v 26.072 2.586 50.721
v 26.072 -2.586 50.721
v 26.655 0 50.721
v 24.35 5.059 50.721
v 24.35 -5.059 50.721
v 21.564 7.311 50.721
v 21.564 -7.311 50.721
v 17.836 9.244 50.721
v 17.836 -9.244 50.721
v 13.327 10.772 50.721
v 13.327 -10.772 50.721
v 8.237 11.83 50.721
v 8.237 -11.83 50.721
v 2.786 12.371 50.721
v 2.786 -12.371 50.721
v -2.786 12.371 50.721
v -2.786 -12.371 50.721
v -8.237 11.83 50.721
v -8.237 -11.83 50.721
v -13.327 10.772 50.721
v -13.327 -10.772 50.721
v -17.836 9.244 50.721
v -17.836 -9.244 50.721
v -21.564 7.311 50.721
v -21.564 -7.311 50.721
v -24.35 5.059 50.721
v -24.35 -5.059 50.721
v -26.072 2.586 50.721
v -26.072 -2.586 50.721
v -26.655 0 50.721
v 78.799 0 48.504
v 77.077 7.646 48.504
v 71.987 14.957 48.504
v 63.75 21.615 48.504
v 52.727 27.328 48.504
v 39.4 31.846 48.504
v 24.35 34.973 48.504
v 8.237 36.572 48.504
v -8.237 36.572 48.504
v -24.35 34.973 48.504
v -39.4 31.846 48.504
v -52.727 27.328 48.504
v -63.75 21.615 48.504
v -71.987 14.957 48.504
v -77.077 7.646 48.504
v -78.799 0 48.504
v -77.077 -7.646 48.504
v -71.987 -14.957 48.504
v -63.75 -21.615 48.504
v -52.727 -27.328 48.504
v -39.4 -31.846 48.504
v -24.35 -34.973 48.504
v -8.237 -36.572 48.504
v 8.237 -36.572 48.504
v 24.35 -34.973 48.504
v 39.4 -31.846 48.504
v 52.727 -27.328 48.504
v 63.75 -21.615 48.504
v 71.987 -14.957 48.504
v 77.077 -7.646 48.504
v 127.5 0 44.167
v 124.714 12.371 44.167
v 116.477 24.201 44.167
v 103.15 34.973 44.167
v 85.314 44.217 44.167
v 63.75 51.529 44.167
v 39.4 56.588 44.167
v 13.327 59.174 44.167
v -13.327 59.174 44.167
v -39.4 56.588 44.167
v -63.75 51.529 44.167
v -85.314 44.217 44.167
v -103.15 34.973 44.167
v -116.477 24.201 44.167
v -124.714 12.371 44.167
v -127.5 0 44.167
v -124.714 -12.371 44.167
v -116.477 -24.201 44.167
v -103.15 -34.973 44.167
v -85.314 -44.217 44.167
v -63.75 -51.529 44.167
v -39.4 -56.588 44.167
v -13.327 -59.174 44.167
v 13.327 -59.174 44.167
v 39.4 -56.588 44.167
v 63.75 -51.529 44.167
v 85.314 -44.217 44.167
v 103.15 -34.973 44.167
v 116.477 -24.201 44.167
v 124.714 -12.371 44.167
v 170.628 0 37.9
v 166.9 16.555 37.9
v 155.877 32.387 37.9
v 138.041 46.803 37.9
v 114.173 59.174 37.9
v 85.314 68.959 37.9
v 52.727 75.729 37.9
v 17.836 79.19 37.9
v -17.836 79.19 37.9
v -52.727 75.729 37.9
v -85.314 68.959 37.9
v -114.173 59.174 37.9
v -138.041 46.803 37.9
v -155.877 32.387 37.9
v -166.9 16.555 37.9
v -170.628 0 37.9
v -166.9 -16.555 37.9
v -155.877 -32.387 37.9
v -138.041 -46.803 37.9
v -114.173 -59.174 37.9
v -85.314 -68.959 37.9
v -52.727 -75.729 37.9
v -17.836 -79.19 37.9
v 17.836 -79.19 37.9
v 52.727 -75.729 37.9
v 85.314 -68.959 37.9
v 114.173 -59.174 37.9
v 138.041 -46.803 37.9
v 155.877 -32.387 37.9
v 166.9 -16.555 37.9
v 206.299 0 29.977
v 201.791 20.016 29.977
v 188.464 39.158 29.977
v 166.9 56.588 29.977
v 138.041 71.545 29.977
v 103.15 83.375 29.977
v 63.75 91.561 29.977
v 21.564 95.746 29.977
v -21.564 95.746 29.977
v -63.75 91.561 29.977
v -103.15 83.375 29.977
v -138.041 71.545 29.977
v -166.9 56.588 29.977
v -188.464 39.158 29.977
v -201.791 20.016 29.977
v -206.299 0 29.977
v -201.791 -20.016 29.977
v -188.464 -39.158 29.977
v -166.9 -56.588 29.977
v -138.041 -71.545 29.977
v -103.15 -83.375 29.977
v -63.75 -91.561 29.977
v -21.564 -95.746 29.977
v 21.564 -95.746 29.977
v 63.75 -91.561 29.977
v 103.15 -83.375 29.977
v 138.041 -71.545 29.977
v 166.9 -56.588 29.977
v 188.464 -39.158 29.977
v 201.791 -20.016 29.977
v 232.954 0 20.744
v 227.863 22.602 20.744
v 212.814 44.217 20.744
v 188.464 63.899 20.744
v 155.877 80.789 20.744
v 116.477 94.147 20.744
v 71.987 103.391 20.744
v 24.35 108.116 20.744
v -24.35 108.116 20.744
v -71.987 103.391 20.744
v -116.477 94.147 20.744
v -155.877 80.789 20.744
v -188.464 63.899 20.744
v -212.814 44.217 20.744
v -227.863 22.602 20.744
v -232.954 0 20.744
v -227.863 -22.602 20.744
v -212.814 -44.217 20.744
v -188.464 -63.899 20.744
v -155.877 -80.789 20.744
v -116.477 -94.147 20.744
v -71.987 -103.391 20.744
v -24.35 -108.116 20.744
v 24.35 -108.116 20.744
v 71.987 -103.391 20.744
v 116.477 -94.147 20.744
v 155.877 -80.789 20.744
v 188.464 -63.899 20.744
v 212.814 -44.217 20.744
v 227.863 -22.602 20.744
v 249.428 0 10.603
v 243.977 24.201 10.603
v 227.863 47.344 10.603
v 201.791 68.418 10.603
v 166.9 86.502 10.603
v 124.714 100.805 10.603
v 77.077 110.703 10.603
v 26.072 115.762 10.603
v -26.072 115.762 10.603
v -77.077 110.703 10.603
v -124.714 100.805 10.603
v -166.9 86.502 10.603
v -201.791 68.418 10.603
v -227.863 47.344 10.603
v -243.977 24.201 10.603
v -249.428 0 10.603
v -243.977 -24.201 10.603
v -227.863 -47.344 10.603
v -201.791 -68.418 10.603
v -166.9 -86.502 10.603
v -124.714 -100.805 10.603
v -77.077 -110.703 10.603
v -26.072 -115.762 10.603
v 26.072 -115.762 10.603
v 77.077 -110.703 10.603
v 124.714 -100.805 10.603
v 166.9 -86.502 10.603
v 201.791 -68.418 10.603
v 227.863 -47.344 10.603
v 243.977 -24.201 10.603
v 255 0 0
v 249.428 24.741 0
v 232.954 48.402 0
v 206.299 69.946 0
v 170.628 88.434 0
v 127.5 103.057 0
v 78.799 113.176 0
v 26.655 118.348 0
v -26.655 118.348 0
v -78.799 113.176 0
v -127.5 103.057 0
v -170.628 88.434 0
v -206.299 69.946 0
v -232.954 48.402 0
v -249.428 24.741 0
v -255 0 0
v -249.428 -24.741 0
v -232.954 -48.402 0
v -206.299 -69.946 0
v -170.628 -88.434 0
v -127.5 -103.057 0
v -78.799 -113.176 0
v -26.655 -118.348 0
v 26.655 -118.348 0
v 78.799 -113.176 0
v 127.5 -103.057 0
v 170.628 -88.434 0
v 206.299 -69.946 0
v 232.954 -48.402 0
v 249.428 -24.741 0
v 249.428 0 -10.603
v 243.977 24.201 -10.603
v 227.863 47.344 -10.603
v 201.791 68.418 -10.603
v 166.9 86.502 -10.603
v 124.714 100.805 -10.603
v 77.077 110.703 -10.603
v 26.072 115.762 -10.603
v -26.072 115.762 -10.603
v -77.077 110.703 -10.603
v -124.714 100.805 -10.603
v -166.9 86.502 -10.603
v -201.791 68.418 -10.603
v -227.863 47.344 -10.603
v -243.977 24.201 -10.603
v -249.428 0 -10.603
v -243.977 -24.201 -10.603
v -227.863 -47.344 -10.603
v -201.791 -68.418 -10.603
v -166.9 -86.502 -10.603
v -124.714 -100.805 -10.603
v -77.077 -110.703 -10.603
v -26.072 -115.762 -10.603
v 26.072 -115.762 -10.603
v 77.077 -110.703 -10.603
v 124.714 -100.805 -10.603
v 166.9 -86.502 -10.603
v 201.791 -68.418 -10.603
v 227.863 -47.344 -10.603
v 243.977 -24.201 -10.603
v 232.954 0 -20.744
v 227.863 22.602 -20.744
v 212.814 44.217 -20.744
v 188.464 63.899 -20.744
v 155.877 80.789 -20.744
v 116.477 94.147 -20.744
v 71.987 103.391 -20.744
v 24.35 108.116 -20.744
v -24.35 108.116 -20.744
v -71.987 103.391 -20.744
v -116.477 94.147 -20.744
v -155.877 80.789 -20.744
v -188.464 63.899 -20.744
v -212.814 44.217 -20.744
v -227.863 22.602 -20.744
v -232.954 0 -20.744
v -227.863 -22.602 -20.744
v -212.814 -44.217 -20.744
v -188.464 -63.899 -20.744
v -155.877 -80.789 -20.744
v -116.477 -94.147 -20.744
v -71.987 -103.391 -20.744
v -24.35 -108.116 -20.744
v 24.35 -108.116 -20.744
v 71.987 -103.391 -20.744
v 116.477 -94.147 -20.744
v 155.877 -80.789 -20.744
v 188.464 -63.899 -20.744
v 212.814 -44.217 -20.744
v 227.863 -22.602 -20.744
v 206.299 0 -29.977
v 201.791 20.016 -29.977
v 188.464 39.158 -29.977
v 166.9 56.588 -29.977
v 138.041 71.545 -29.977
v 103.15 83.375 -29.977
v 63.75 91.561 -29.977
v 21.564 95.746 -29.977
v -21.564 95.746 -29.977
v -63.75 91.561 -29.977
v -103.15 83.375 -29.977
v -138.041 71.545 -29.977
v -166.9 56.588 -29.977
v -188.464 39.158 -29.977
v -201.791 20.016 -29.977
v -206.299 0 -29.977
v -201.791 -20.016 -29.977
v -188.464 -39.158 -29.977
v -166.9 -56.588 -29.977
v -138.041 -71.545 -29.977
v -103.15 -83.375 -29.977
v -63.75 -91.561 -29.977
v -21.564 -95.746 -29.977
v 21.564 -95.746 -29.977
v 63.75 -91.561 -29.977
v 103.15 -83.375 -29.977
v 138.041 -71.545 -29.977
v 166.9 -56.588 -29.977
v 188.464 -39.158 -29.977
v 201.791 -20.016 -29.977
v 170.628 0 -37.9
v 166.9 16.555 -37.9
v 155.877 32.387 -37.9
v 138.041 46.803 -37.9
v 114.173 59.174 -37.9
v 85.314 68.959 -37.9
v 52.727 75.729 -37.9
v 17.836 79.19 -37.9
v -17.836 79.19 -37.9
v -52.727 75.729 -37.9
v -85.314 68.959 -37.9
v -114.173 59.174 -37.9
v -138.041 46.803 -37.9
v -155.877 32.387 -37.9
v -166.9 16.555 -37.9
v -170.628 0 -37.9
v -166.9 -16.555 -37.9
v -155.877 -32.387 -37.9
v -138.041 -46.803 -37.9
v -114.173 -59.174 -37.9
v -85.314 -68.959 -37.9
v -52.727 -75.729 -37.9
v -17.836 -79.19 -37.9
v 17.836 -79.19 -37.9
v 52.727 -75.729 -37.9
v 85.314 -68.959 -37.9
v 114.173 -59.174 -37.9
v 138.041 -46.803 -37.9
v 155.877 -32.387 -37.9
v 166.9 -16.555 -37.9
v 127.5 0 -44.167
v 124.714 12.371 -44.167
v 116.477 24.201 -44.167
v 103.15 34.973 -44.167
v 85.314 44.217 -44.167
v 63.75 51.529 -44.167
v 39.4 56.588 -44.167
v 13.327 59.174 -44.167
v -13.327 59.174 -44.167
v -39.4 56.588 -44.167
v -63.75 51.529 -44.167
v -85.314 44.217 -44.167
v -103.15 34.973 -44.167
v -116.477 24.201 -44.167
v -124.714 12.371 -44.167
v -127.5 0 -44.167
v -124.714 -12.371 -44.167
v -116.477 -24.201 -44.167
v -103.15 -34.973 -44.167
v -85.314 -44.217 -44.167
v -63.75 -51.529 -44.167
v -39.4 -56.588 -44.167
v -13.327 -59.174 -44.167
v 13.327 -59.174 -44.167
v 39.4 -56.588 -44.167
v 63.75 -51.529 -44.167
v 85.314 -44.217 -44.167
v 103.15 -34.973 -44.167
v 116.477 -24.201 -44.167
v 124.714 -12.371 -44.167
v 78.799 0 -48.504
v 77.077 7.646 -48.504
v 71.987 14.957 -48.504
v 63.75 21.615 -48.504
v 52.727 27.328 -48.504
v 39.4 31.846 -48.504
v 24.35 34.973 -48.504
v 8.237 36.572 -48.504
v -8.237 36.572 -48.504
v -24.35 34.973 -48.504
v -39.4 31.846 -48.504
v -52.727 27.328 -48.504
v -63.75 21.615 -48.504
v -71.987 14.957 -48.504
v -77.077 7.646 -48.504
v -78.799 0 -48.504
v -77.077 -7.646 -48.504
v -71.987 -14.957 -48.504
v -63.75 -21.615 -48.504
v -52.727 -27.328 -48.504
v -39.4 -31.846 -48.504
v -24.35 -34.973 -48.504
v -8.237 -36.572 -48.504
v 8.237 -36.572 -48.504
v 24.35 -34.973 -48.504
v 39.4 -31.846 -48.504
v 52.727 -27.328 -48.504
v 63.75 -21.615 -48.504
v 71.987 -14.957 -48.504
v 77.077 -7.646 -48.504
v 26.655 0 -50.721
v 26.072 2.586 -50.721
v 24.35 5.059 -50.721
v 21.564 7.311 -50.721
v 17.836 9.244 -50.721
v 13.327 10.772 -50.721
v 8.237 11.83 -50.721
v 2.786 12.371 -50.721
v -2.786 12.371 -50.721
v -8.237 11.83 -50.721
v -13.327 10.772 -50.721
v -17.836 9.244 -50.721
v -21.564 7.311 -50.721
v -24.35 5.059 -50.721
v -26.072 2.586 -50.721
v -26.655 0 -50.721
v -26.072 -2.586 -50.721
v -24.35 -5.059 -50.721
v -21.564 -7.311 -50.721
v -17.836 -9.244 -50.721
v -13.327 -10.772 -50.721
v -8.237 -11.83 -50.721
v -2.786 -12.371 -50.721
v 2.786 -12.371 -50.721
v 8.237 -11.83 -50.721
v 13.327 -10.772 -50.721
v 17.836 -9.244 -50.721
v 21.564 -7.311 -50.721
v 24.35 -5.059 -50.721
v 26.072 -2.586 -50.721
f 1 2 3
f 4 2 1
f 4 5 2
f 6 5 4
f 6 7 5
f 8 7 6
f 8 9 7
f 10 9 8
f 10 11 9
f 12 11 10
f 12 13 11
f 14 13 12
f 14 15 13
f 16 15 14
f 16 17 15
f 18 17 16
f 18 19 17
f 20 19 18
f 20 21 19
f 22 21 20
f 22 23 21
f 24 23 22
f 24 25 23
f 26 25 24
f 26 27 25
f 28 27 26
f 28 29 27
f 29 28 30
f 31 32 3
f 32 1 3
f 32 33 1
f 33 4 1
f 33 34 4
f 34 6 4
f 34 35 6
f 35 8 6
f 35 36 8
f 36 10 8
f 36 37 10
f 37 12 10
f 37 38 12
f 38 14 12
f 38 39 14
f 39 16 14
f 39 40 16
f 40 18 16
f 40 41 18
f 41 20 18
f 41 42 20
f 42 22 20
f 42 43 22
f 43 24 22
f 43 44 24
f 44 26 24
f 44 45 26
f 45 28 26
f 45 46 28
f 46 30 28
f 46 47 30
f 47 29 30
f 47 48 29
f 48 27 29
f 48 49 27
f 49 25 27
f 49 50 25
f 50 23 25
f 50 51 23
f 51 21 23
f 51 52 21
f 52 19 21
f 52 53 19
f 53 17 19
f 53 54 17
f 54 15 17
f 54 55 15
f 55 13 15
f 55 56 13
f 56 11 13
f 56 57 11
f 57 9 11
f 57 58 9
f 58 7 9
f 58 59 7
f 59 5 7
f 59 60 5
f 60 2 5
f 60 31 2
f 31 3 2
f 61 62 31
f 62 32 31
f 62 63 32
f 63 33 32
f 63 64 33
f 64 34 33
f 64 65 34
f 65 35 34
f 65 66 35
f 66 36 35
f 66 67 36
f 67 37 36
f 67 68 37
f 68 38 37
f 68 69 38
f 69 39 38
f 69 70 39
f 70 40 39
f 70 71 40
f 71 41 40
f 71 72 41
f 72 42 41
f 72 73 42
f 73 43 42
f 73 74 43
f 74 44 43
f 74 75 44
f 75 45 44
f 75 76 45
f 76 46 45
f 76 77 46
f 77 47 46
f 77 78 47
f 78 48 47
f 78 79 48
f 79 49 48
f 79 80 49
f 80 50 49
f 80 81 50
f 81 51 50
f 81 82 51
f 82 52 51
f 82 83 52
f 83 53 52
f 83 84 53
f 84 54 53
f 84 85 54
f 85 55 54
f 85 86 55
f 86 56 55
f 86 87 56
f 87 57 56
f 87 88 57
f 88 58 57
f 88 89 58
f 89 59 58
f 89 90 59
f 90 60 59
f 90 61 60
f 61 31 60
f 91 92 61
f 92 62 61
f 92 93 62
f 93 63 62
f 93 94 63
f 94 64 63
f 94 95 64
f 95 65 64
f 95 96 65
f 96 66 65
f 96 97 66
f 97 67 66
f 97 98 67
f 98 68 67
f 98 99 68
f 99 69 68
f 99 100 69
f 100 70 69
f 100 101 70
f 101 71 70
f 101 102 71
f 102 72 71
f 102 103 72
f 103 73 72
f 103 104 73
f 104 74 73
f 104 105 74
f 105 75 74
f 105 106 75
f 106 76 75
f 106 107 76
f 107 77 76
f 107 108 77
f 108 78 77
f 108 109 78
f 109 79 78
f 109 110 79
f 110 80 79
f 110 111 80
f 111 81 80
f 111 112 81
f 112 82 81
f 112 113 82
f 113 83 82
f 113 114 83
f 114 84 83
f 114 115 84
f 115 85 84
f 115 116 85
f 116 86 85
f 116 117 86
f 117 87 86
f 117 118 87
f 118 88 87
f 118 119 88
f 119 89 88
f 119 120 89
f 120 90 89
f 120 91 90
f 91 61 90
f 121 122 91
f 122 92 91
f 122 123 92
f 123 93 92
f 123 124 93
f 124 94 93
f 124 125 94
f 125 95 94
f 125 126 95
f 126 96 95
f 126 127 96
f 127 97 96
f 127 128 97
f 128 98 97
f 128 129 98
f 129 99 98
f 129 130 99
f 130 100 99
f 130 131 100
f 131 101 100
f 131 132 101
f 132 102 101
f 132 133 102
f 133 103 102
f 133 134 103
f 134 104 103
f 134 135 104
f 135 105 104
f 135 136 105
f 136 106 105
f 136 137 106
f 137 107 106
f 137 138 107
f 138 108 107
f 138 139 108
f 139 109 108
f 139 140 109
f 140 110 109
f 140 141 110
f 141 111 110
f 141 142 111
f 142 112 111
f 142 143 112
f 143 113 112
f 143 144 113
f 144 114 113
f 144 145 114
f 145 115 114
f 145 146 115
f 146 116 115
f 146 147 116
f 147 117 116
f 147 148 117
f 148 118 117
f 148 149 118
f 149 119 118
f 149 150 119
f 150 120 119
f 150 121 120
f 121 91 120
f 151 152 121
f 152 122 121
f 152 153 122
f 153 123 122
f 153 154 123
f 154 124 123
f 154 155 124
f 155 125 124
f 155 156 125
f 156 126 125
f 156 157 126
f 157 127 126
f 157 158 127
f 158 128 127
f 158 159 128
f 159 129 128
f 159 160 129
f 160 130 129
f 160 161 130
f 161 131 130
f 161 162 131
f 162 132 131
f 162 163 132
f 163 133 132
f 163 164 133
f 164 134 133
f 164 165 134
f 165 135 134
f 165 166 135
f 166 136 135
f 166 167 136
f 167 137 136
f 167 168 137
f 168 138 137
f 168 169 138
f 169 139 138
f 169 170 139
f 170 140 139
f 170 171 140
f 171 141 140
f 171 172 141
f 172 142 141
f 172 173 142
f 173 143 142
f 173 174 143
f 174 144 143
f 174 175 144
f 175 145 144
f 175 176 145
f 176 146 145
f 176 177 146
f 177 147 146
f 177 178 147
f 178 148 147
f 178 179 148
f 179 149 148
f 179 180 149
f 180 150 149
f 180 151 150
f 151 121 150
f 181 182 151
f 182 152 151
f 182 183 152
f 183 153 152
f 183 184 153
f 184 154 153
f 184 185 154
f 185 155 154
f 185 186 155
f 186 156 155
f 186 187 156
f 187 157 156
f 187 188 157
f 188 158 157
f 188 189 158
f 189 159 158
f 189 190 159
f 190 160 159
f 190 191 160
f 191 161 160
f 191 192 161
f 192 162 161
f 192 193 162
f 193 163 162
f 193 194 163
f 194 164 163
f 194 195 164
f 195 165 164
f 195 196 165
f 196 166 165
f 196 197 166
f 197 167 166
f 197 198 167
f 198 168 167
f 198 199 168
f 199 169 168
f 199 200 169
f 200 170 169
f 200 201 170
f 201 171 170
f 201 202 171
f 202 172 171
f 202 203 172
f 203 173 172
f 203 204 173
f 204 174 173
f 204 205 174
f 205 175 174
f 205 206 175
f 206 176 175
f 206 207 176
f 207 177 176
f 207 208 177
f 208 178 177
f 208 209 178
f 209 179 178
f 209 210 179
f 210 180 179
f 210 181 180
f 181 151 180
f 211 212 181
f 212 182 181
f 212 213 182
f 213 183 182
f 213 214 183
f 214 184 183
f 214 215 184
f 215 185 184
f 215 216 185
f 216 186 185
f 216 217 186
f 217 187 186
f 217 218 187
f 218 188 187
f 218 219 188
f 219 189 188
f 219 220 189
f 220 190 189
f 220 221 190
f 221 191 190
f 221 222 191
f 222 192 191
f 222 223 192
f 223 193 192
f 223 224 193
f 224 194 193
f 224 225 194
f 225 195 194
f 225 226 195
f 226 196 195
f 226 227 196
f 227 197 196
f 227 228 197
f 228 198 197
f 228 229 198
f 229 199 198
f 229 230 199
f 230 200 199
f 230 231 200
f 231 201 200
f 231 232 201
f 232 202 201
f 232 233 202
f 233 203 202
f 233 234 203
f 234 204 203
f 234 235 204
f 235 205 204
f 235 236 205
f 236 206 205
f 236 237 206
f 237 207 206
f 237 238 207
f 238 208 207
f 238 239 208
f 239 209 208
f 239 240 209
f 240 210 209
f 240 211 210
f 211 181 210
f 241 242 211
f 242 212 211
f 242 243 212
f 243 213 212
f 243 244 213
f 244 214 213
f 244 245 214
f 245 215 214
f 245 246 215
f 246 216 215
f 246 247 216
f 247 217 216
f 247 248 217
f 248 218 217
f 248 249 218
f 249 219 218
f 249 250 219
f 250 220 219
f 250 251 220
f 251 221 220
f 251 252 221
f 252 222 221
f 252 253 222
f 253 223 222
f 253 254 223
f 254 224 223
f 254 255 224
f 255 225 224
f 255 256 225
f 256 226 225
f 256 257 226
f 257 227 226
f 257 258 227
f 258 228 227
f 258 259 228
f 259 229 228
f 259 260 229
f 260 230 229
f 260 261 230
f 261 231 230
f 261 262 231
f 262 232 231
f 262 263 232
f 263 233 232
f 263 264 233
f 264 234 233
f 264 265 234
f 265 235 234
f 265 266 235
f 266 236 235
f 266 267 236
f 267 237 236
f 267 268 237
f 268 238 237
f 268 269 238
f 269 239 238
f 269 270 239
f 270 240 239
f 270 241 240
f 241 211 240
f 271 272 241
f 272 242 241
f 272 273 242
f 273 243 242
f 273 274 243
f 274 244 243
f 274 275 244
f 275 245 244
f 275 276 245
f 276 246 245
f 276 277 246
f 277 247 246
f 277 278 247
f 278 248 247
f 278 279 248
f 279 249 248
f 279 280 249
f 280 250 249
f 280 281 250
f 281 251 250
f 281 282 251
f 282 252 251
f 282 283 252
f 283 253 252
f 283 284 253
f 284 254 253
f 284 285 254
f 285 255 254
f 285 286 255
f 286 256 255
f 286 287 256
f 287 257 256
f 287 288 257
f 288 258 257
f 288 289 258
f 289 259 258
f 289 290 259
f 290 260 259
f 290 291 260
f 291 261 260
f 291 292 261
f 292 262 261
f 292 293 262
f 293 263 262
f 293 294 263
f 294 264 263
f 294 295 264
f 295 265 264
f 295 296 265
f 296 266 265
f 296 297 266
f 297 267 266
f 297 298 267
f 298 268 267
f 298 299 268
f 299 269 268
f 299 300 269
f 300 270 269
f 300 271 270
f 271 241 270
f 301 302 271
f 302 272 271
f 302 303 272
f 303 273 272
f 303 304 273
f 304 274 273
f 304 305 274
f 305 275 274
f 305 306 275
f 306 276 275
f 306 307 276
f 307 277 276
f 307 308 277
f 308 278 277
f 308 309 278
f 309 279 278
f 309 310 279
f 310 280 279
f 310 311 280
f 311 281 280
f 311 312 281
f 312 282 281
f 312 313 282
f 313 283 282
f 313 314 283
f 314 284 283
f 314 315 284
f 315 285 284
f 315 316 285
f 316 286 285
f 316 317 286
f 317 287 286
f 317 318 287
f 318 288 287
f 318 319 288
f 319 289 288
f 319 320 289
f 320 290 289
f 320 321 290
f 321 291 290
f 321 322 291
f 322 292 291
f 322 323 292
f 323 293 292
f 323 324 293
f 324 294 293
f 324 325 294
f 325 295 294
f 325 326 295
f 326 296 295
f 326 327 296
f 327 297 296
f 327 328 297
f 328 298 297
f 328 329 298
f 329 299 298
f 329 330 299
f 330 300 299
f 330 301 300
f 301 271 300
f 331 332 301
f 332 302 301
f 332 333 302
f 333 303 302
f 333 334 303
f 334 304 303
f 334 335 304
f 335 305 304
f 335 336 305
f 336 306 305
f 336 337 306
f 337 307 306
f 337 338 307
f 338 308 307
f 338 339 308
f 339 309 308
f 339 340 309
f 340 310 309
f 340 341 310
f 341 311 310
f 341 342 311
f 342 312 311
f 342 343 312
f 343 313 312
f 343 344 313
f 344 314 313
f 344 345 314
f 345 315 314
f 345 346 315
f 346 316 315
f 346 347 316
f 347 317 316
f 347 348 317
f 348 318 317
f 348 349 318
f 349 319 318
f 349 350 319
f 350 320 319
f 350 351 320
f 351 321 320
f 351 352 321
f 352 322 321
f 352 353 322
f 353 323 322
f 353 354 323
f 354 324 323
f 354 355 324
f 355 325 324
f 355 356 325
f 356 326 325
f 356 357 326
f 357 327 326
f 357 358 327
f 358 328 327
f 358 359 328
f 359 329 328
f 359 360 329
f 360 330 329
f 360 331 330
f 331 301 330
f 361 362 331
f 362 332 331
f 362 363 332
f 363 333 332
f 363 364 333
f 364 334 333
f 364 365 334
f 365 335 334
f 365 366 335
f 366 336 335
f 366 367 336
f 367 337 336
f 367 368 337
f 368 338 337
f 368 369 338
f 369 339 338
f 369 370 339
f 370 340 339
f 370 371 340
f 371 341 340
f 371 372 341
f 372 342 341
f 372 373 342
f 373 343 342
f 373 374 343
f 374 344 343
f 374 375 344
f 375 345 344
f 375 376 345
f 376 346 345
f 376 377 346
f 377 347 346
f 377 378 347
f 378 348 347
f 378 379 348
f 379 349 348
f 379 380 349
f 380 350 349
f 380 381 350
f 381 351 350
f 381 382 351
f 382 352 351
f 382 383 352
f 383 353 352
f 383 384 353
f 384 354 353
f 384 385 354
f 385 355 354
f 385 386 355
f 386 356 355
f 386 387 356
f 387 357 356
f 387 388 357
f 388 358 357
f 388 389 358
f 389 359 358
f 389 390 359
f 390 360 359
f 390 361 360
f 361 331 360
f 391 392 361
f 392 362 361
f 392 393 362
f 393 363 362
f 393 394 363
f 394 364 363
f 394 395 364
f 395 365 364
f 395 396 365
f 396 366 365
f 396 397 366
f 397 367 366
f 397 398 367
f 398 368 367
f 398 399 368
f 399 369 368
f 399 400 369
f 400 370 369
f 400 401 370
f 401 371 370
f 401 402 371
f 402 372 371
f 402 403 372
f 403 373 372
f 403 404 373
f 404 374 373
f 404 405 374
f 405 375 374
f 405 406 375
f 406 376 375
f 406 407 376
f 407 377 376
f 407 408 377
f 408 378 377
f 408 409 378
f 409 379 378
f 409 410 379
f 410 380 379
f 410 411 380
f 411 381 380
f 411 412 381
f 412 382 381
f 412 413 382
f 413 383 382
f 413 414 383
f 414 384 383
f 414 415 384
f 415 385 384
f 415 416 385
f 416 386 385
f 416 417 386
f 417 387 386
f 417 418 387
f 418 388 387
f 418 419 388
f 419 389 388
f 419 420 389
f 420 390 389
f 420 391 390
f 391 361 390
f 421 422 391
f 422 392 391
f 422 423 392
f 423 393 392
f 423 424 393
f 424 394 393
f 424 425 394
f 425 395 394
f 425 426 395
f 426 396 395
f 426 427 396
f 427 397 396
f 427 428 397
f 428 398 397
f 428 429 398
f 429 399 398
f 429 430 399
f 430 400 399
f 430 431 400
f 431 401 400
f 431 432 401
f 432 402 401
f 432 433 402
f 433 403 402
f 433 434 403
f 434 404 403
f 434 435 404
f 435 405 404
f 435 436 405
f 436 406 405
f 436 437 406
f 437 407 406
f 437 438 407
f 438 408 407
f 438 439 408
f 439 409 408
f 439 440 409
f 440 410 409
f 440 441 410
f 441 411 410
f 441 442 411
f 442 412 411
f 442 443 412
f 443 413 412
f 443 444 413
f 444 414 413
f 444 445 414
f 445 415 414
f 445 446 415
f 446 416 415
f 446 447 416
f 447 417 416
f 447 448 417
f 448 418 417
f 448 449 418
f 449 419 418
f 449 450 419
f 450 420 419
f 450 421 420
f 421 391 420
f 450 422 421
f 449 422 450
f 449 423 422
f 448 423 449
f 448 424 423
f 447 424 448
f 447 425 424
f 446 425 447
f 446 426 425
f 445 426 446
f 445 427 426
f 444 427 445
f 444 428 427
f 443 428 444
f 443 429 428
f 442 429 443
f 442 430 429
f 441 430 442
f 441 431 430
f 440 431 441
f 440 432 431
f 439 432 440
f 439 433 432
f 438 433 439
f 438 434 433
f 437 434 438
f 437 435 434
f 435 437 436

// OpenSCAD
// Generated by SolidPython 1.0.1 on 2020-07-29 00:46:51


scale(v = [15, 7, 3]) {
	sphere(r = 17);
}
/***********************************************
*********      SolidPython code:      **********
************************************************
 
# import packages: SolidPython
from solid import *
from solid.utils import *
from itertools import chain, combinations, permutations


class Resize:

    def __init__(self, scad_file):
        self.scad_file = scad_file
        #self.scad_file = import_scad(scad_file)
        # cone/cylinder param:
        self.r1 = 0
        self.r2 = 0
        self.h = 0
        # rectangular prism param:
        self.w = 0
        self.l = 0
        # ellipse param:
        self.r = 0

    # import OpenScad code (file name corresponds to shape)


    # classify shape + parameters
    def assign(self, param1, param2, param3):
        if self.scad_file == 'cone.scad':
            self.r1 = param1
            self.r2 = param2
            self.h = param3
        elif self.scad_file == 'cylinder.scad':
            self.r1 = param1
            self.r2 = param2
            self.h = param3
        elif self.scad_file == 'rectangularPrism.scad':
            self.h = param1
            self.l = param2
            self.w = param3
        else:
            self.r = param1
            self.h = param2

    # resize parameters
    def iterate(self):
        x = range(3, 20, 2)
        i = 1
        if self.scad_file == 'cone.scad':
            tempList = list(permutations(x, 2))
            for temp in tempList:
                param1 = temp[0]
                param2 = temp[1]
                filepath = 'produced_scad_files/' + 'cone' + str(param1) + '_' + str(param2) + '_' + '.scad'
                scad_render_to_file(cylinder(h=param1, r1=param2, r2=0), filepath)

        elif self.scad_file == 'cylinder.scad':
            tempList = list(permutations(x, 3))
            for temp in tempList:
                param1 = temp[0]
                param2 = temp[1]
                filepath = 'produced_scad_files/' + 'cylinder' + str(param1) + '_' + str(param2) + '_' + '.scad'
                scad_render_to_file(cylinder(h=param1, r1=param2, r2=param2), filepath)

        elif self.scad_file == 'rectangularPrism.scad':
            tempList = list(permutations(x, 3))
            for temp in tempList:
                param1 = temp[0]
                param2 = temp[1]
                param3 = temp[2]
                filepath = 'produced_scad_files/' + 'rectangularPrism' + str(param1) + '_' + str(param2) + '_' + str(
                    param3) + '.scad'
                scad_render_to_file(cube(size=(param1, param2, param3)), filepath)

        elif self.scad_file == 'ellipse.scad':
            tempList = list(permutations(x, 4))
            for temp in tempList:
                param1 = temp[0]
                param2 = temp[1]
                param3 = temp[2]
                param4 = temp[3]
                filepath = 'produced_scad_files/' + 'ellipse' + str(param1) + '_' + str(param2) + '_' + str(param3) + '_' + str(param4) + '.scad'
                scad_render_to_file(scale([param1, param2, param3])(sphere(r=param4)), filepath)

    def render_to_scadfile(self):
        scad_render_to_file(scad, 'example.scad') 
 
************************************************/
